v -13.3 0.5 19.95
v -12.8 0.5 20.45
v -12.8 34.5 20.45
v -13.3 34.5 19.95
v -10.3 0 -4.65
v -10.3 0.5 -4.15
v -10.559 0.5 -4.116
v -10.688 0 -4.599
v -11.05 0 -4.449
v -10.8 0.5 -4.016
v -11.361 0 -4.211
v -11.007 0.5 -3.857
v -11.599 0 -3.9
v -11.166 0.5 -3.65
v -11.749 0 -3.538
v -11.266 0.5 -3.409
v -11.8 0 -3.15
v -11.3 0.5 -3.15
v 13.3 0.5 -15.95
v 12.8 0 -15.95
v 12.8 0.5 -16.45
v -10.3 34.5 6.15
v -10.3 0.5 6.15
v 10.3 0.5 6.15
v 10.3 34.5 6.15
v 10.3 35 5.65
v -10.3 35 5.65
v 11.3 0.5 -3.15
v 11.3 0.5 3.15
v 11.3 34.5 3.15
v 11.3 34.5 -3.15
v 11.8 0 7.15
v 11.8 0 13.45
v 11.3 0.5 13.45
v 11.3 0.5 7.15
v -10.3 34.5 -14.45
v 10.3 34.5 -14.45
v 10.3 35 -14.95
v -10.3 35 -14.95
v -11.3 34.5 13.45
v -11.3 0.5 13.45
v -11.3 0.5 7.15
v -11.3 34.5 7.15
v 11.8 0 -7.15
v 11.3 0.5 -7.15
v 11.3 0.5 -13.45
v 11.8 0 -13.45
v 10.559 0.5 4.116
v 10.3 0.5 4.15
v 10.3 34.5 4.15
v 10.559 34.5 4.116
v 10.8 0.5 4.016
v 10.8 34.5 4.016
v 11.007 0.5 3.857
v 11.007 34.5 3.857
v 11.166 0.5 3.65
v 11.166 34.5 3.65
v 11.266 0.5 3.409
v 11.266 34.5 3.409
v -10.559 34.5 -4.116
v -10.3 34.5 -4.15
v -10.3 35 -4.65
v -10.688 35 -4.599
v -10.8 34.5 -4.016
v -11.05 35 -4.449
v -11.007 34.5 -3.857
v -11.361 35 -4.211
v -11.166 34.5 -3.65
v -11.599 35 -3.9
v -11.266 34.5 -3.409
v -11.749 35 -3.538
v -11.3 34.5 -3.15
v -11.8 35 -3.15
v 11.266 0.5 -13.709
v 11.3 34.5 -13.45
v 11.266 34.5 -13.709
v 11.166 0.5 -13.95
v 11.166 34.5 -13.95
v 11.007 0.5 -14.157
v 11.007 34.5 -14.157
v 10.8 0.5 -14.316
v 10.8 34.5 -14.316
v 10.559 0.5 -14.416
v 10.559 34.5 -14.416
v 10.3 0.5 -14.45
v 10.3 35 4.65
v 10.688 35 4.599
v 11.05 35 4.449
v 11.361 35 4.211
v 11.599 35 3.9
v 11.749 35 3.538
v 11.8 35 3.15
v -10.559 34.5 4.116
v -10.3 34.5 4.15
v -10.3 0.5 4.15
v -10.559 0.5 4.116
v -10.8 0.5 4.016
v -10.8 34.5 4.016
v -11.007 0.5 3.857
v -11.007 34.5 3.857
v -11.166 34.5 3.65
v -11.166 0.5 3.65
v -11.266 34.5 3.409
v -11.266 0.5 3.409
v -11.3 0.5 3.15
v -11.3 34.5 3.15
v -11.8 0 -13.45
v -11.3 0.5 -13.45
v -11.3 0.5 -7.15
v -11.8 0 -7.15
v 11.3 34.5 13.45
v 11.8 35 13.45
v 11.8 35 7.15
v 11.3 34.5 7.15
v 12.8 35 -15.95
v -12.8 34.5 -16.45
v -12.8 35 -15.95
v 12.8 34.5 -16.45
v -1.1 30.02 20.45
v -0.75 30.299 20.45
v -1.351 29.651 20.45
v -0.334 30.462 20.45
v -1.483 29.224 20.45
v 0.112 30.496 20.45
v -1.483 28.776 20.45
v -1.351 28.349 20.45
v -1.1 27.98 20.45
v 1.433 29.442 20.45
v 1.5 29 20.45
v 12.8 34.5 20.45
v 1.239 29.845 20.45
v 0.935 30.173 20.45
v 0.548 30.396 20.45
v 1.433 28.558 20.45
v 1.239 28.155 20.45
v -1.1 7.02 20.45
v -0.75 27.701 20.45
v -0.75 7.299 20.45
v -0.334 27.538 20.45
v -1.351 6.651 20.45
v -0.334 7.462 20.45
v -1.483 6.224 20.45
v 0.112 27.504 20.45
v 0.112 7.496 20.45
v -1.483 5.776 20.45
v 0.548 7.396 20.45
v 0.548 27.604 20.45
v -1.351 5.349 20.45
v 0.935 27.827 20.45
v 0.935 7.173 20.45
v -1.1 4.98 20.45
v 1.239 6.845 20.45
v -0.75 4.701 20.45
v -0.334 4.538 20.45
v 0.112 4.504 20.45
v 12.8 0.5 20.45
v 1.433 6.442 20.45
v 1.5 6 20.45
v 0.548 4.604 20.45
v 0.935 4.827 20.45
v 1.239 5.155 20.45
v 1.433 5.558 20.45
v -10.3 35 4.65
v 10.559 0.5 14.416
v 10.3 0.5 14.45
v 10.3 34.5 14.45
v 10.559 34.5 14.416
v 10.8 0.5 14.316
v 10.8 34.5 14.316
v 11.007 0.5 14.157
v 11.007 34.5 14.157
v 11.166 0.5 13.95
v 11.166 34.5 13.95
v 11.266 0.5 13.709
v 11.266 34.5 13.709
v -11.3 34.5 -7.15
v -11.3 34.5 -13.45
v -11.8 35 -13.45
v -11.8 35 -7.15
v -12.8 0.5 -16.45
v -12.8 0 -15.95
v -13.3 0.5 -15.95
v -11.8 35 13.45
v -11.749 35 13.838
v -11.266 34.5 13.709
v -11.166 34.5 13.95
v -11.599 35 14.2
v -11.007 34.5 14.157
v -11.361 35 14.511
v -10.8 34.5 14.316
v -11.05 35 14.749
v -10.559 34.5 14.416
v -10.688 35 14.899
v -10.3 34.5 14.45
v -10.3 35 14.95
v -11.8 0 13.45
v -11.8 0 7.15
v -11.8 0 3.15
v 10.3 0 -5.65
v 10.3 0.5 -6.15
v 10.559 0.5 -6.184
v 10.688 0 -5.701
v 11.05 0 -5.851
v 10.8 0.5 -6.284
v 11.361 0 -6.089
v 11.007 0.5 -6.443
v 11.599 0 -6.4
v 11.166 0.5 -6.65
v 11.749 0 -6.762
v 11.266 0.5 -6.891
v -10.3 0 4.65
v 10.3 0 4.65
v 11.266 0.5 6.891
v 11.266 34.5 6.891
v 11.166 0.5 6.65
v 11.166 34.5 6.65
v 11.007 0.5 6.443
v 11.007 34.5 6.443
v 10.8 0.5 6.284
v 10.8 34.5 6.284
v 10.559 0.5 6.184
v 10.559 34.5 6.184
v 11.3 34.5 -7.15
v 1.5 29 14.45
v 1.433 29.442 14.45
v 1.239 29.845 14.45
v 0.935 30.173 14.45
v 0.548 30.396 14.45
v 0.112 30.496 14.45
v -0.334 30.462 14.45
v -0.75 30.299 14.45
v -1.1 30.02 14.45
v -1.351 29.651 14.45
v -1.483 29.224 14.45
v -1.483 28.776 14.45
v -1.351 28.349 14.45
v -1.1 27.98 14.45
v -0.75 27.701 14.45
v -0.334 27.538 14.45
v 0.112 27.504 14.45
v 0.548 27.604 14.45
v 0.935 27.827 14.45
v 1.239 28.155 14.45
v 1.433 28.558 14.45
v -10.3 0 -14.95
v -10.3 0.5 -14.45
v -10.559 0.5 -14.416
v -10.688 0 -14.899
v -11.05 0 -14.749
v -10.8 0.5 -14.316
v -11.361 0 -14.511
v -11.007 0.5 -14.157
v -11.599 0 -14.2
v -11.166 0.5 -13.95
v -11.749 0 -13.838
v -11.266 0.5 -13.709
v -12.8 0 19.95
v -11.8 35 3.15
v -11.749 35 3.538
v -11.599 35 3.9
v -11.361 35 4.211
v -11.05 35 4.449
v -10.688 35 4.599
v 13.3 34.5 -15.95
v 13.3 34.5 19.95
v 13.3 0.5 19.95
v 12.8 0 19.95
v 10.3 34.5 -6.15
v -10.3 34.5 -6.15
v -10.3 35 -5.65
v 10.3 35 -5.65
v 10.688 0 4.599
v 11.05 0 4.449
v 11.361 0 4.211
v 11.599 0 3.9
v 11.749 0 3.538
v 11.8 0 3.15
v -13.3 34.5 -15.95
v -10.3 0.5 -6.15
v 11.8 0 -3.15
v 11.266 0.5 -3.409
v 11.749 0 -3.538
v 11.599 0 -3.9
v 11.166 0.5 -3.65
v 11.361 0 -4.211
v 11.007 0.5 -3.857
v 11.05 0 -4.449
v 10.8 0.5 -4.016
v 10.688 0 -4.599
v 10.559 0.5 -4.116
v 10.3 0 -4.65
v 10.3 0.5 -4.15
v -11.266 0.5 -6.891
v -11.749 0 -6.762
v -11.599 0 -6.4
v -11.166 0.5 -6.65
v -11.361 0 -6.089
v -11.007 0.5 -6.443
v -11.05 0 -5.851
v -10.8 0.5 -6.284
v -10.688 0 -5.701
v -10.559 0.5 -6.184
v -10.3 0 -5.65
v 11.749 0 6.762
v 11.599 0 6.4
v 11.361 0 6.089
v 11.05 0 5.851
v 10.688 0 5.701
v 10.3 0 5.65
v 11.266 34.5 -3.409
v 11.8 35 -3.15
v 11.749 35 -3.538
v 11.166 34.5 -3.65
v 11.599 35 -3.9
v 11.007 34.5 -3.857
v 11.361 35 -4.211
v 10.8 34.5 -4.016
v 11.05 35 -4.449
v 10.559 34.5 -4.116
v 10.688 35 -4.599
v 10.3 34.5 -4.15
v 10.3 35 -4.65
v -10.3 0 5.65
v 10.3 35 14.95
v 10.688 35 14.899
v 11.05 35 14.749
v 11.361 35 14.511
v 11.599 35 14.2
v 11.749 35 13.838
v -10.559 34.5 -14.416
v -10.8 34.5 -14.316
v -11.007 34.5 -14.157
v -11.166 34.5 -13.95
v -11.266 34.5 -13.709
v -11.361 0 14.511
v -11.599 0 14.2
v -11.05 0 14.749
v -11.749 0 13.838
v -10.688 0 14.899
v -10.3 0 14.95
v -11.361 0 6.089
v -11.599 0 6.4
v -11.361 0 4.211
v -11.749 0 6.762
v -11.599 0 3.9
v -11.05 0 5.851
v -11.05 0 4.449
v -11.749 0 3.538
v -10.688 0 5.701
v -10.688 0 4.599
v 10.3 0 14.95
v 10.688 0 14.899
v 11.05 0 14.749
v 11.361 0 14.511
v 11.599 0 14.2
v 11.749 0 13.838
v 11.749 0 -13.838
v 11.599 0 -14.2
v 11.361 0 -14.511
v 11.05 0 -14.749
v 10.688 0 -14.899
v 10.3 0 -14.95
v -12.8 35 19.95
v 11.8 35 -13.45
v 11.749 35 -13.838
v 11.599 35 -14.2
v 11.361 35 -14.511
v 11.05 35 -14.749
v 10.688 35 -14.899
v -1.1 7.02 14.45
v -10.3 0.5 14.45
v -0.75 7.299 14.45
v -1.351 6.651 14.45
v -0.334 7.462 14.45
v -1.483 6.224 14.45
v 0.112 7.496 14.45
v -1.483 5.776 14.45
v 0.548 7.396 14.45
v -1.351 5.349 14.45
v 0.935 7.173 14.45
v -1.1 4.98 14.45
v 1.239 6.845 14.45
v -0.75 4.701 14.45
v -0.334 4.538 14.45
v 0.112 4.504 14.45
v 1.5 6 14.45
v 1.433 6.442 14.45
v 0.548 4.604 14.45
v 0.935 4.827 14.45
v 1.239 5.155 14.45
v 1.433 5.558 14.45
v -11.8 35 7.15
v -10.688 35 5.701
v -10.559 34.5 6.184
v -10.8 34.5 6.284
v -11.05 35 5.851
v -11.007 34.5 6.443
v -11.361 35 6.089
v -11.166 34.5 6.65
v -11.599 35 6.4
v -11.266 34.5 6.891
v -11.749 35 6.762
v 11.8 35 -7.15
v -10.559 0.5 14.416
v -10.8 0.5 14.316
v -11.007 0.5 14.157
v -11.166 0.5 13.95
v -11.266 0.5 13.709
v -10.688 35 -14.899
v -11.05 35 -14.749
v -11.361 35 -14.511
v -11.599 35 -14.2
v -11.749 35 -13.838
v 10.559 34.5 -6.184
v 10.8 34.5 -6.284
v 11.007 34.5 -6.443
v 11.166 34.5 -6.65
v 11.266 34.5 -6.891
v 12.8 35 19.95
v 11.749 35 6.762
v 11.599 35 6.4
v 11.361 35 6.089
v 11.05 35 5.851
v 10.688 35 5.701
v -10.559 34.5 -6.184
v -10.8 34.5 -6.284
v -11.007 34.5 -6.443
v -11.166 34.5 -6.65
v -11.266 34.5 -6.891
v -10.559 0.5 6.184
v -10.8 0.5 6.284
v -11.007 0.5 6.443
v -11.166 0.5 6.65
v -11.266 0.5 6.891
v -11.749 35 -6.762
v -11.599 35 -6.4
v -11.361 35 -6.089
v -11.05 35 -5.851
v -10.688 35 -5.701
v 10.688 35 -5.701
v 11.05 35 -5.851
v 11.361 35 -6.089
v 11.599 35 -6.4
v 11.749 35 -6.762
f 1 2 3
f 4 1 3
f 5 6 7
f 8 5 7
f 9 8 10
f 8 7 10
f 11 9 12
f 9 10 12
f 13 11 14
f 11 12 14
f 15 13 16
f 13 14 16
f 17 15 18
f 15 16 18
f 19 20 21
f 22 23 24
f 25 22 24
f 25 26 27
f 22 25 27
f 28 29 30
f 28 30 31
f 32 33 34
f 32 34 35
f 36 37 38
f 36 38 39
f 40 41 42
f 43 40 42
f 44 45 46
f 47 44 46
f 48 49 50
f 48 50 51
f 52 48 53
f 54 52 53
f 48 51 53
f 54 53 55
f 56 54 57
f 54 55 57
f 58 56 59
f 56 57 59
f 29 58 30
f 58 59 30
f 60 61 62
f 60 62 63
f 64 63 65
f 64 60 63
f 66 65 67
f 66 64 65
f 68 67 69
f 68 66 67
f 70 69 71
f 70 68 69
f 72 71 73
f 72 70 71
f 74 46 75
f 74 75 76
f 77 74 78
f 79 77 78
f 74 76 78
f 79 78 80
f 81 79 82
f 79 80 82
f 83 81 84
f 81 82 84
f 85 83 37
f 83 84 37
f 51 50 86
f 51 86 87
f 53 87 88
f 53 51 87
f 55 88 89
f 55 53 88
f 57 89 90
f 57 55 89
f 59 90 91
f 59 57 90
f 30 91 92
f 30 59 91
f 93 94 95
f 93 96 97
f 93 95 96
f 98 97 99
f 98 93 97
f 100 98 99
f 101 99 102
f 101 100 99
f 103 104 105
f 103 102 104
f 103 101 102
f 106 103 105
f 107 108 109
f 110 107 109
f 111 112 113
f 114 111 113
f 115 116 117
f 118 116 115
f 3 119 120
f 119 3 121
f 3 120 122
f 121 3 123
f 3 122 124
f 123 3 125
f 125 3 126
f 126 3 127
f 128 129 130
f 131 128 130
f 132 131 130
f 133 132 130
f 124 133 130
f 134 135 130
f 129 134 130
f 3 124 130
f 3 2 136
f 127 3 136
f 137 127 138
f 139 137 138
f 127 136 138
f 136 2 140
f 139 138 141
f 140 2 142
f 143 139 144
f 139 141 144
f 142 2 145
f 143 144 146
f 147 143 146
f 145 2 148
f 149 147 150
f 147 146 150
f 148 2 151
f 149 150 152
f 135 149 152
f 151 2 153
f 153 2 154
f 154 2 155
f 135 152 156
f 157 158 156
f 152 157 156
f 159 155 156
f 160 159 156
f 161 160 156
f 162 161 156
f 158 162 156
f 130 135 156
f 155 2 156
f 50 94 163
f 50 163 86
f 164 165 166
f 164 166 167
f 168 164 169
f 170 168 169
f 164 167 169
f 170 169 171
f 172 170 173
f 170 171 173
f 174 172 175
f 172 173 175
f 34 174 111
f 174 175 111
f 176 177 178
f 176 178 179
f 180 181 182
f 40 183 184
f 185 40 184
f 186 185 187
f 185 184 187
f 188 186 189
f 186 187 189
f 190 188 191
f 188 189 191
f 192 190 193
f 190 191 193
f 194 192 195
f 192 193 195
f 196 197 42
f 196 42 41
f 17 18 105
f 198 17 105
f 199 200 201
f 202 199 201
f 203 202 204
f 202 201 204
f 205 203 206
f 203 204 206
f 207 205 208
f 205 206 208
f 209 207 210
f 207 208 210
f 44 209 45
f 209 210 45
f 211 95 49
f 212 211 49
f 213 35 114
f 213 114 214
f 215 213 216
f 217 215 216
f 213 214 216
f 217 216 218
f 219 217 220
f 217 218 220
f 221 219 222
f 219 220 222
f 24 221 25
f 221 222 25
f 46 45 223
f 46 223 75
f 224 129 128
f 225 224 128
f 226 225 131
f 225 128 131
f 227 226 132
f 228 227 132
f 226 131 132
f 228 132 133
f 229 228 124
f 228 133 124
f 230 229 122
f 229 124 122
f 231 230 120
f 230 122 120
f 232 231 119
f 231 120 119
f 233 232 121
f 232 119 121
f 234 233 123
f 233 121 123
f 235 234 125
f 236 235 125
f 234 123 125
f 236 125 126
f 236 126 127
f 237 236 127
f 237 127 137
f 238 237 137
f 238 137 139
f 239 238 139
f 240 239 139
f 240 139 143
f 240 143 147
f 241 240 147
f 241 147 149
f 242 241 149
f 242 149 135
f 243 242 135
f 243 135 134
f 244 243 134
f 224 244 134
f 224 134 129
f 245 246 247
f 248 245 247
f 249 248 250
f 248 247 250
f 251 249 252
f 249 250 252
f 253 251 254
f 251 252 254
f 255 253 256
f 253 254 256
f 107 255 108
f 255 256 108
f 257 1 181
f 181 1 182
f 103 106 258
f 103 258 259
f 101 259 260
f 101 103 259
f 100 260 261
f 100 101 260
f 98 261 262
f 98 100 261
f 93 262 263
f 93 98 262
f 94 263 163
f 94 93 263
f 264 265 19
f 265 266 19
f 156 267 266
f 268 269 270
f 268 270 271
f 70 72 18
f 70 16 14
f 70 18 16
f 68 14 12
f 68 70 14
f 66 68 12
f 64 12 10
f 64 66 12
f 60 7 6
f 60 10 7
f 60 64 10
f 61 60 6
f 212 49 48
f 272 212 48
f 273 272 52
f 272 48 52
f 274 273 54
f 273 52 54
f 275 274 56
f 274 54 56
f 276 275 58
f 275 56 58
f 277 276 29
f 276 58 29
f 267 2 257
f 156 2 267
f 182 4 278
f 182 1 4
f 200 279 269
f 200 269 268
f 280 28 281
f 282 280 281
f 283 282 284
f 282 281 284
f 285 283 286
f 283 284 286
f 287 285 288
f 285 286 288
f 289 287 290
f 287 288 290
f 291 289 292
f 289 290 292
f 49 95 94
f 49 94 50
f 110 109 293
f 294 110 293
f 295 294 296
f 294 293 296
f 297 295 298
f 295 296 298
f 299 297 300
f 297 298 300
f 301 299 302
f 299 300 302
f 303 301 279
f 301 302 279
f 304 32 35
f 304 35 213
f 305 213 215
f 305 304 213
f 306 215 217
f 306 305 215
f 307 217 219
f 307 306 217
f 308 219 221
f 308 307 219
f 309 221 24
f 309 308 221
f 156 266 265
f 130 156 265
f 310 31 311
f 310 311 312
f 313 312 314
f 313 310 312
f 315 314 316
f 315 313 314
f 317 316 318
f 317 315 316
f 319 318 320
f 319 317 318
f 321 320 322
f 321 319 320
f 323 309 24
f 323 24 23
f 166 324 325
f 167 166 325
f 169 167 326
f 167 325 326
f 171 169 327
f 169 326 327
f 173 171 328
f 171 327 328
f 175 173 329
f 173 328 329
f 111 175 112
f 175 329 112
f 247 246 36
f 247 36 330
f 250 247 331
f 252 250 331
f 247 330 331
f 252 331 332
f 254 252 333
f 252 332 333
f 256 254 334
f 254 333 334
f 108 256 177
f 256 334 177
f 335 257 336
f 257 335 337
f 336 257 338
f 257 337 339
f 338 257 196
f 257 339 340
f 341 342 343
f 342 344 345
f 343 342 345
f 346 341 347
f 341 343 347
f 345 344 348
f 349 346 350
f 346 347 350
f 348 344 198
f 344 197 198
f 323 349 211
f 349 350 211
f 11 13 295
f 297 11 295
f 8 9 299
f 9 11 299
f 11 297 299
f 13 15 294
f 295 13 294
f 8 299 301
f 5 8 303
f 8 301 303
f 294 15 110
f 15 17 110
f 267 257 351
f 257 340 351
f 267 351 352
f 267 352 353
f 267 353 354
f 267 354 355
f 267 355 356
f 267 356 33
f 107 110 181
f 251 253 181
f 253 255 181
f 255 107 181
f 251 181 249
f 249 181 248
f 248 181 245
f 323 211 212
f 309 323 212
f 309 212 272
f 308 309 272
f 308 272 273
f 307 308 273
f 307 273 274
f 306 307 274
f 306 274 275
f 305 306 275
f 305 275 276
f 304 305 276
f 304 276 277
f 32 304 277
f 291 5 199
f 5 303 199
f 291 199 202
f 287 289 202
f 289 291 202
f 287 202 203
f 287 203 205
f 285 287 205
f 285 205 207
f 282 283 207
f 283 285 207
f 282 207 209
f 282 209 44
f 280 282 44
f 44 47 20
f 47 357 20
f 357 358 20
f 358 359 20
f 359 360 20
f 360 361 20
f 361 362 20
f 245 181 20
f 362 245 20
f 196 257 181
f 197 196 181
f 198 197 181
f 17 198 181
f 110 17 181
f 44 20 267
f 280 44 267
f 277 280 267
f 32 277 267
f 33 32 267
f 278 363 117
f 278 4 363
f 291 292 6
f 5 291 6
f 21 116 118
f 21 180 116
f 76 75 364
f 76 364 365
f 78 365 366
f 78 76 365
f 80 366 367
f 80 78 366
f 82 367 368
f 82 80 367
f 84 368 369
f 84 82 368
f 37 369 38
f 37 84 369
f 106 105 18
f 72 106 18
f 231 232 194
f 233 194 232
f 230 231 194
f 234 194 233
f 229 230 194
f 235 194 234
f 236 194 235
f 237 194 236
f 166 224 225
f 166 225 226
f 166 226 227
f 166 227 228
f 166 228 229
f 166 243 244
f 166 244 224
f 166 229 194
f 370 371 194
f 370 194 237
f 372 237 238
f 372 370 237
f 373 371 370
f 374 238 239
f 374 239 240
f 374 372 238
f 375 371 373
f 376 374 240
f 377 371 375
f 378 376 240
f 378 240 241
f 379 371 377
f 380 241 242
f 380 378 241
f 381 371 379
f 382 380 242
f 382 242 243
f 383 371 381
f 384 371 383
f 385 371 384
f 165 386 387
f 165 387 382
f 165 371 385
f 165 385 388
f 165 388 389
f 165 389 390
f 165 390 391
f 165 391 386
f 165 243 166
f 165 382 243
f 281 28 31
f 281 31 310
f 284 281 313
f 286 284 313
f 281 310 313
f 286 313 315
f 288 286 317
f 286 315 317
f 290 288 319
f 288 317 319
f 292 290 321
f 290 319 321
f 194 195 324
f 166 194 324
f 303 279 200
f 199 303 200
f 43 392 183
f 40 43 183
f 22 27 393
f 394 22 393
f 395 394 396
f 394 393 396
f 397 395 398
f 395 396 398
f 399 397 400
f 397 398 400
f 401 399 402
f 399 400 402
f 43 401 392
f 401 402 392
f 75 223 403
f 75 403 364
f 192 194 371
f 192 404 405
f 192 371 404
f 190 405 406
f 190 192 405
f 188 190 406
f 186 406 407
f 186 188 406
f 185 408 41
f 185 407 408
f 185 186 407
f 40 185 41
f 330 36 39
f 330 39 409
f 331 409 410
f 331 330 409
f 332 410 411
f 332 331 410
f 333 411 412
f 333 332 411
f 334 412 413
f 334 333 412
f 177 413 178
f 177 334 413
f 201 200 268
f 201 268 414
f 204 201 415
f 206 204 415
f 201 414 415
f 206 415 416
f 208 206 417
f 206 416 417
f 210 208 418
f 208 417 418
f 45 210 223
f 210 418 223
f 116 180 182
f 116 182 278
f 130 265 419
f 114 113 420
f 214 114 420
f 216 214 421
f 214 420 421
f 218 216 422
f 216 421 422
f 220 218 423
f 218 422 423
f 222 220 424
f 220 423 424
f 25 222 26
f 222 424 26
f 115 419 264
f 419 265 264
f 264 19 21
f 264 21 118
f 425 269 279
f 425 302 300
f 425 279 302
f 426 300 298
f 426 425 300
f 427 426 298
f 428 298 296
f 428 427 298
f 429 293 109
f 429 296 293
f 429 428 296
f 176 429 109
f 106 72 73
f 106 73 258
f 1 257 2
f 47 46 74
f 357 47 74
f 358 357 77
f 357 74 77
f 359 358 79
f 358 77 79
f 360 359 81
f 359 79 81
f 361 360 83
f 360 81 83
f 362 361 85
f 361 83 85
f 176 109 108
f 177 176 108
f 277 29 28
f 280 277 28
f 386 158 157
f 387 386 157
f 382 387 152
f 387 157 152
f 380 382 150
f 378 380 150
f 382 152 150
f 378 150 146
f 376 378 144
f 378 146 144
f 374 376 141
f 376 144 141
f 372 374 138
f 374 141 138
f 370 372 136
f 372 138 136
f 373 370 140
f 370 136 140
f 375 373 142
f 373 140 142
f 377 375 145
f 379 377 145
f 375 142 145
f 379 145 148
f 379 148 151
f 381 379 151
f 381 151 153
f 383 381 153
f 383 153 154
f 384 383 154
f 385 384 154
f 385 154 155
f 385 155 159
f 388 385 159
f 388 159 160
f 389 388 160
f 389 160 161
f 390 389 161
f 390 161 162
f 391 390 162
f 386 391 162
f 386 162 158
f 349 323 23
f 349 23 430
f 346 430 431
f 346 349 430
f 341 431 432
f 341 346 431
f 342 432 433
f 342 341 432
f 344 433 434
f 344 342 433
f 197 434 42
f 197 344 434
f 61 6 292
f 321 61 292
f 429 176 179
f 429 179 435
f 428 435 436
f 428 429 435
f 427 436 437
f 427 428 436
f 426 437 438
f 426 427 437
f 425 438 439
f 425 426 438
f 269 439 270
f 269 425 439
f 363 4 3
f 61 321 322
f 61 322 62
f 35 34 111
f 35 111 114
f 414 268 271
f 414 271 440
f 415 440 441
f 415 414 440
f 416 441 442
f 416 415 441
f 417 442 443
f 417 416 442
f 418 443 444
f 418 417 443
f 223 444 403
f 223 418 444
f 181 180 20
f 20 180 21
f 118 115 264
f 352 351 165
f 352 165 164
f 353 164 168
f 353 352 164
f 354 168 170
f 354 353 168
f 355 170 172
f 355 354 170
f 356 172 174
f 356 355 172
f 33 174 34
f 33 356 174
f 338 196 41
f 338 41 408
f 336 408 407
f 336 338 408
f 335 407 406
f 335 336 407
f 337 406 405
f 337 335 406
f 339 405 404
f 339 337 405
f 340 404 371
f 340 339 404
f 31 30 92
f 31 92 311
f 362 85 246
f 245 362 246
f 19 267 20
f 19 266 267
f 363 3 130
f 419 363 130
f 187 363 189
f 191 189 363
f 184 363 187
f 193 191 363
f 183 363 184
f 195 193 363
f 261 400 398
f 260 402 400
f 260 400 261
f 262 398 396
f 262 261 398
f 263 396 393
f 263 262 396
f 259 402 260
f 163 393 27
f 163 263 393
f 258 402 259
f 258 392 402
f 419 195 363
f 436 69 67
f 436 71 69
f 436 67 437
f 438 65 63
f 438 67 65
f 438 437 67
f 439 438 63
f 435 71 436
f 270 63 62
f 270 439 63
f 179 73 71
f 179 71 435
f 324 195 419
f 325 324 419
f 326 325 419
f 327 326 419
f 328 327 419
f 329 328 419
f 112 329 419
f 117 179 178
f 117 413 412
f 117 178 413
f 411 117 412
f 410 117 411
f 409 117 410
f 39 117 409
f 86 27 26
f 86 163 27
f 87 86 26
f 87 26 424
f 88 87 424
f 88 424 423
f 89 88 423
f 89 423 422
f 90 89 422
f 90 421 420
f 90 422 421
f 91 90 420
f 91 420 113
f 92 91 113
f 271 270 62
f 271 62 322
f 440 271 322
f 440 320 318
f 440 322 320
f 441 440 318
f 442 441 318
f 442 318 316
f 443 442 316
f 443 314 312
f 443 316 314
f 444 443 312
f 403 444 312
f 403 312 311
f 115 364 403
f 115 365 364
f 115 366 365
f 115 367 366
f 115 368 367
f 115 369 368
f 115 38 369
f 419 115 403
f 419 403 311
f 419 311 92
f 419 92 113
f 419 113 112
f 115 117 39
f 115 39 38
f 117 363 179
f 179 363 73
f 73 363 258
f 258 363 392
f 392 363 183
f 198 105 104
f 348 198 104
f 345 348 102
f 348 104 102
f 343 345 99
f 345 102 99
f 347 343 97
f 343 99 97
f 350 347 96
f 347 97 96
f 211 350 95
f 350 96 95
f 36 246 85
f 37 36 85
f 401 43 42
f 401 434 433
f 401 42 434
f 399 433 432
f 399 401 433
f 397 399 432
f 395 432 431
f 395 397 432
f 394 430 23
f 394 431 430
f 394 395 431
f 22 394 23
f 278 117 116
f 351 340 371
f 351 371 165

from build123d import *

# Parameters (mm, degrees)
SKETCH2_W           = 26.6
SKETCH2_H           = 36.9
SKETCH2_W_2         = 22.6
SKETCH2_H_2         = 8.3
BOSS_EXTRUDE2_DEPTH = 35
FILLET1_R           = 1
CHAMFER1_SIZE       = 0.5
CUT_EXTRUDE1_REACH  = 54.569
SKETCH3_R           = 1.5


with BuildPart() as part:
    # Sketch2 → Boss-Extrude2 (new body)
    with BuildSketch(Plane(origin=(0, 0, 0), x_dir=(1, 0, 0), z_dir=(0, 1, 0))):
        with Locations((0, -2)):
            Rectangle(SKETCH2_W, SKETCH2_H)
        with Locations((0, -10.3)):
            Rectangle(SKETCH2_W_2, SKETCH2_H_2, mode=Mode.SUBTRACT)
        Rectangle(SKETCH2_W_2, SKETCH2_H_2, mode=Mode.SUBTRACT)
        with Locations((0, 10.3)):
            Rectangle(SKETCH2_W_2, SKETCH2_H_2, mode=Mode.SUBTRACT)
    extrude(amount=BOSS_EXTRUDE2_DEPTH)

    # Fillet1
    fillet1_edges = [part.edges().sort_by_distance(p)[0] for p in [
        (-11.3, 17.5, 6.15),
        (-11.3, 17.5, 14.45),
        (11.3, 17.5, 14.45),
        (11.3, 17.5, 6.15),
        (-11.3, 17.5, -4.15),
        (-11.3, 17.5, 4.15),
        (11.3, 17.5, 4.15),
        (11.3, 17.5, -4.15),
        (-11.3, 17.5, -14.45),
        (-11.3, 17.5, -6.15),
        (11.3, 17.5, -6.15),
        (11.3, 17.5, -14.45),
    ]]
    fillet(fillet1_edges, radius=FILLET1_R)

    # Chamfer1
    chamfer1_edges = [part.edges().sort_by_distance(p)[0] for p in [
        (13.3, 35, 2),
        (0, 35, -16.45),
        (-13.3, 35, 2),
        (0, 0, -16.45),
        (13.3, 0, 2),
        (0, 0, 20.45),
        (0, 0, 14.45),
        (0, 35, 14.45),
        (11.3, 0, 10.3),
        (-13.3, 0, 2),
        (11.3, 35, 10.3),
        (-11.3, 0, 10.3),
        (-11.3, 35, 10.3),
        (0, 0, 6.15),
        (0, 35, 6.15),
        (0, 0, 4.15),
        (0, 35, 4.15),
        (11.3, 0, 0),
        (11.3, 35, 0),
        (0, 0, -4.15),
        (0, 35, -4.15),
        (-11.3, 0, 0),
        (-11.3, 35, 0),
        (11.3, 0, -10.3),
        (-13.3, 17.5, -16.45),
        (11.3, 35, -10.3),
        (13.3, 17.5, -16.45),
        (13.3, 17.5, 20.45),
        (0, 0, -14.45),
        (0, 35, -14.45),
        (-13.3, 17.5, 20.45),
        (0, 0, -6.15),
        (0, 35, -6.15),
        (-11.3, 0, -10.3),
        (-11.3, 35, -10.3),
        (11.007106781, 0, 14.157106781),
        (11.007106781, 35, 14.157106781),
        (-11.007106781, 0, 14.157106781),
        (-11.007106781, 35, 14.157106781),
        (0, 35, 20.45),
        (-11.007106781, 0, 6.442893219),
        (-11.007106781, 35, 6.442893219),
        (11.007106781, 0, 6.442893219),
        (11.007106781, 35, 6.442893219),
        (11.007106781, 0, 3.857106781),
        (11.007106781, 35, 3.857106781),
        (11.007106781, 0, -3.857106781),
        (11.007106781, 35, -3.857106781),
        (-11.007106781, 0, -3.857106781),
        (-11.007106781, 35, -3.857106781),
        (-11.007106781, 0, 3.857106781),
        (-11.007106781, 35, 3.857106781),
        (11.007106781, 0, -14.157106781),
        (11.007106781, 35, -14.157106781),
        (11.007106781, 0, -6.442893219),
        (11.007106781, 35, -6.442893219),
        (-11.007106781, 0, -14.157106781),
        (-11.007106781, 35, -14.157106781),
        (-11.007106781, 0, -6.442893219),
        (-11.007106781, 35, -6.442893219),
    ]]
    chamfer(chamfer1_edges, length=CHAMFER1_SIZE)

    # Sketch3 → Cut-Extrude1 (cut, up to next)
    with BuildSketch(Plane.XY.offset(20.45), mode=Mode.PRIVATE) as cut_extrude1_sk1:
        with Locations((0, 29)):
            Circle(SKETCH3_R)
    cut_extrude1_tool1 = extrude(cut_extrude1_sk1.sketch, amount=-CUT_EXTRUDE1_REACH, mode=Mode.PRIVATE) & part.part
    # Sketch3 → Cut-Extrude1 (cut, up to next)
    with BuildSketch(Plane.XY.offset(20.45), mode=Mode.PRIVATE) as cut_extrude1_sk2:
        with Locations((0, 6)):
            Circle(SKETCH3_R)
    cut_extrude1_tool2 = extrude(cut_extrude1_sk2.sketch, amount=-CUT_EXTRUDE1_REACH, mode=Mode.PRIVATE) & part.part
    add(cut_extrude1_tool1.solids().sort_by_distance((0, 29, 20.45))[0], mode=Mode.SUBTRACT)
    add(cut_extrude1_tool2.solids().sort_by_distance((0, 6, 20.45))[0], mode=Mode.SUBTRACT)


solid = part.part
